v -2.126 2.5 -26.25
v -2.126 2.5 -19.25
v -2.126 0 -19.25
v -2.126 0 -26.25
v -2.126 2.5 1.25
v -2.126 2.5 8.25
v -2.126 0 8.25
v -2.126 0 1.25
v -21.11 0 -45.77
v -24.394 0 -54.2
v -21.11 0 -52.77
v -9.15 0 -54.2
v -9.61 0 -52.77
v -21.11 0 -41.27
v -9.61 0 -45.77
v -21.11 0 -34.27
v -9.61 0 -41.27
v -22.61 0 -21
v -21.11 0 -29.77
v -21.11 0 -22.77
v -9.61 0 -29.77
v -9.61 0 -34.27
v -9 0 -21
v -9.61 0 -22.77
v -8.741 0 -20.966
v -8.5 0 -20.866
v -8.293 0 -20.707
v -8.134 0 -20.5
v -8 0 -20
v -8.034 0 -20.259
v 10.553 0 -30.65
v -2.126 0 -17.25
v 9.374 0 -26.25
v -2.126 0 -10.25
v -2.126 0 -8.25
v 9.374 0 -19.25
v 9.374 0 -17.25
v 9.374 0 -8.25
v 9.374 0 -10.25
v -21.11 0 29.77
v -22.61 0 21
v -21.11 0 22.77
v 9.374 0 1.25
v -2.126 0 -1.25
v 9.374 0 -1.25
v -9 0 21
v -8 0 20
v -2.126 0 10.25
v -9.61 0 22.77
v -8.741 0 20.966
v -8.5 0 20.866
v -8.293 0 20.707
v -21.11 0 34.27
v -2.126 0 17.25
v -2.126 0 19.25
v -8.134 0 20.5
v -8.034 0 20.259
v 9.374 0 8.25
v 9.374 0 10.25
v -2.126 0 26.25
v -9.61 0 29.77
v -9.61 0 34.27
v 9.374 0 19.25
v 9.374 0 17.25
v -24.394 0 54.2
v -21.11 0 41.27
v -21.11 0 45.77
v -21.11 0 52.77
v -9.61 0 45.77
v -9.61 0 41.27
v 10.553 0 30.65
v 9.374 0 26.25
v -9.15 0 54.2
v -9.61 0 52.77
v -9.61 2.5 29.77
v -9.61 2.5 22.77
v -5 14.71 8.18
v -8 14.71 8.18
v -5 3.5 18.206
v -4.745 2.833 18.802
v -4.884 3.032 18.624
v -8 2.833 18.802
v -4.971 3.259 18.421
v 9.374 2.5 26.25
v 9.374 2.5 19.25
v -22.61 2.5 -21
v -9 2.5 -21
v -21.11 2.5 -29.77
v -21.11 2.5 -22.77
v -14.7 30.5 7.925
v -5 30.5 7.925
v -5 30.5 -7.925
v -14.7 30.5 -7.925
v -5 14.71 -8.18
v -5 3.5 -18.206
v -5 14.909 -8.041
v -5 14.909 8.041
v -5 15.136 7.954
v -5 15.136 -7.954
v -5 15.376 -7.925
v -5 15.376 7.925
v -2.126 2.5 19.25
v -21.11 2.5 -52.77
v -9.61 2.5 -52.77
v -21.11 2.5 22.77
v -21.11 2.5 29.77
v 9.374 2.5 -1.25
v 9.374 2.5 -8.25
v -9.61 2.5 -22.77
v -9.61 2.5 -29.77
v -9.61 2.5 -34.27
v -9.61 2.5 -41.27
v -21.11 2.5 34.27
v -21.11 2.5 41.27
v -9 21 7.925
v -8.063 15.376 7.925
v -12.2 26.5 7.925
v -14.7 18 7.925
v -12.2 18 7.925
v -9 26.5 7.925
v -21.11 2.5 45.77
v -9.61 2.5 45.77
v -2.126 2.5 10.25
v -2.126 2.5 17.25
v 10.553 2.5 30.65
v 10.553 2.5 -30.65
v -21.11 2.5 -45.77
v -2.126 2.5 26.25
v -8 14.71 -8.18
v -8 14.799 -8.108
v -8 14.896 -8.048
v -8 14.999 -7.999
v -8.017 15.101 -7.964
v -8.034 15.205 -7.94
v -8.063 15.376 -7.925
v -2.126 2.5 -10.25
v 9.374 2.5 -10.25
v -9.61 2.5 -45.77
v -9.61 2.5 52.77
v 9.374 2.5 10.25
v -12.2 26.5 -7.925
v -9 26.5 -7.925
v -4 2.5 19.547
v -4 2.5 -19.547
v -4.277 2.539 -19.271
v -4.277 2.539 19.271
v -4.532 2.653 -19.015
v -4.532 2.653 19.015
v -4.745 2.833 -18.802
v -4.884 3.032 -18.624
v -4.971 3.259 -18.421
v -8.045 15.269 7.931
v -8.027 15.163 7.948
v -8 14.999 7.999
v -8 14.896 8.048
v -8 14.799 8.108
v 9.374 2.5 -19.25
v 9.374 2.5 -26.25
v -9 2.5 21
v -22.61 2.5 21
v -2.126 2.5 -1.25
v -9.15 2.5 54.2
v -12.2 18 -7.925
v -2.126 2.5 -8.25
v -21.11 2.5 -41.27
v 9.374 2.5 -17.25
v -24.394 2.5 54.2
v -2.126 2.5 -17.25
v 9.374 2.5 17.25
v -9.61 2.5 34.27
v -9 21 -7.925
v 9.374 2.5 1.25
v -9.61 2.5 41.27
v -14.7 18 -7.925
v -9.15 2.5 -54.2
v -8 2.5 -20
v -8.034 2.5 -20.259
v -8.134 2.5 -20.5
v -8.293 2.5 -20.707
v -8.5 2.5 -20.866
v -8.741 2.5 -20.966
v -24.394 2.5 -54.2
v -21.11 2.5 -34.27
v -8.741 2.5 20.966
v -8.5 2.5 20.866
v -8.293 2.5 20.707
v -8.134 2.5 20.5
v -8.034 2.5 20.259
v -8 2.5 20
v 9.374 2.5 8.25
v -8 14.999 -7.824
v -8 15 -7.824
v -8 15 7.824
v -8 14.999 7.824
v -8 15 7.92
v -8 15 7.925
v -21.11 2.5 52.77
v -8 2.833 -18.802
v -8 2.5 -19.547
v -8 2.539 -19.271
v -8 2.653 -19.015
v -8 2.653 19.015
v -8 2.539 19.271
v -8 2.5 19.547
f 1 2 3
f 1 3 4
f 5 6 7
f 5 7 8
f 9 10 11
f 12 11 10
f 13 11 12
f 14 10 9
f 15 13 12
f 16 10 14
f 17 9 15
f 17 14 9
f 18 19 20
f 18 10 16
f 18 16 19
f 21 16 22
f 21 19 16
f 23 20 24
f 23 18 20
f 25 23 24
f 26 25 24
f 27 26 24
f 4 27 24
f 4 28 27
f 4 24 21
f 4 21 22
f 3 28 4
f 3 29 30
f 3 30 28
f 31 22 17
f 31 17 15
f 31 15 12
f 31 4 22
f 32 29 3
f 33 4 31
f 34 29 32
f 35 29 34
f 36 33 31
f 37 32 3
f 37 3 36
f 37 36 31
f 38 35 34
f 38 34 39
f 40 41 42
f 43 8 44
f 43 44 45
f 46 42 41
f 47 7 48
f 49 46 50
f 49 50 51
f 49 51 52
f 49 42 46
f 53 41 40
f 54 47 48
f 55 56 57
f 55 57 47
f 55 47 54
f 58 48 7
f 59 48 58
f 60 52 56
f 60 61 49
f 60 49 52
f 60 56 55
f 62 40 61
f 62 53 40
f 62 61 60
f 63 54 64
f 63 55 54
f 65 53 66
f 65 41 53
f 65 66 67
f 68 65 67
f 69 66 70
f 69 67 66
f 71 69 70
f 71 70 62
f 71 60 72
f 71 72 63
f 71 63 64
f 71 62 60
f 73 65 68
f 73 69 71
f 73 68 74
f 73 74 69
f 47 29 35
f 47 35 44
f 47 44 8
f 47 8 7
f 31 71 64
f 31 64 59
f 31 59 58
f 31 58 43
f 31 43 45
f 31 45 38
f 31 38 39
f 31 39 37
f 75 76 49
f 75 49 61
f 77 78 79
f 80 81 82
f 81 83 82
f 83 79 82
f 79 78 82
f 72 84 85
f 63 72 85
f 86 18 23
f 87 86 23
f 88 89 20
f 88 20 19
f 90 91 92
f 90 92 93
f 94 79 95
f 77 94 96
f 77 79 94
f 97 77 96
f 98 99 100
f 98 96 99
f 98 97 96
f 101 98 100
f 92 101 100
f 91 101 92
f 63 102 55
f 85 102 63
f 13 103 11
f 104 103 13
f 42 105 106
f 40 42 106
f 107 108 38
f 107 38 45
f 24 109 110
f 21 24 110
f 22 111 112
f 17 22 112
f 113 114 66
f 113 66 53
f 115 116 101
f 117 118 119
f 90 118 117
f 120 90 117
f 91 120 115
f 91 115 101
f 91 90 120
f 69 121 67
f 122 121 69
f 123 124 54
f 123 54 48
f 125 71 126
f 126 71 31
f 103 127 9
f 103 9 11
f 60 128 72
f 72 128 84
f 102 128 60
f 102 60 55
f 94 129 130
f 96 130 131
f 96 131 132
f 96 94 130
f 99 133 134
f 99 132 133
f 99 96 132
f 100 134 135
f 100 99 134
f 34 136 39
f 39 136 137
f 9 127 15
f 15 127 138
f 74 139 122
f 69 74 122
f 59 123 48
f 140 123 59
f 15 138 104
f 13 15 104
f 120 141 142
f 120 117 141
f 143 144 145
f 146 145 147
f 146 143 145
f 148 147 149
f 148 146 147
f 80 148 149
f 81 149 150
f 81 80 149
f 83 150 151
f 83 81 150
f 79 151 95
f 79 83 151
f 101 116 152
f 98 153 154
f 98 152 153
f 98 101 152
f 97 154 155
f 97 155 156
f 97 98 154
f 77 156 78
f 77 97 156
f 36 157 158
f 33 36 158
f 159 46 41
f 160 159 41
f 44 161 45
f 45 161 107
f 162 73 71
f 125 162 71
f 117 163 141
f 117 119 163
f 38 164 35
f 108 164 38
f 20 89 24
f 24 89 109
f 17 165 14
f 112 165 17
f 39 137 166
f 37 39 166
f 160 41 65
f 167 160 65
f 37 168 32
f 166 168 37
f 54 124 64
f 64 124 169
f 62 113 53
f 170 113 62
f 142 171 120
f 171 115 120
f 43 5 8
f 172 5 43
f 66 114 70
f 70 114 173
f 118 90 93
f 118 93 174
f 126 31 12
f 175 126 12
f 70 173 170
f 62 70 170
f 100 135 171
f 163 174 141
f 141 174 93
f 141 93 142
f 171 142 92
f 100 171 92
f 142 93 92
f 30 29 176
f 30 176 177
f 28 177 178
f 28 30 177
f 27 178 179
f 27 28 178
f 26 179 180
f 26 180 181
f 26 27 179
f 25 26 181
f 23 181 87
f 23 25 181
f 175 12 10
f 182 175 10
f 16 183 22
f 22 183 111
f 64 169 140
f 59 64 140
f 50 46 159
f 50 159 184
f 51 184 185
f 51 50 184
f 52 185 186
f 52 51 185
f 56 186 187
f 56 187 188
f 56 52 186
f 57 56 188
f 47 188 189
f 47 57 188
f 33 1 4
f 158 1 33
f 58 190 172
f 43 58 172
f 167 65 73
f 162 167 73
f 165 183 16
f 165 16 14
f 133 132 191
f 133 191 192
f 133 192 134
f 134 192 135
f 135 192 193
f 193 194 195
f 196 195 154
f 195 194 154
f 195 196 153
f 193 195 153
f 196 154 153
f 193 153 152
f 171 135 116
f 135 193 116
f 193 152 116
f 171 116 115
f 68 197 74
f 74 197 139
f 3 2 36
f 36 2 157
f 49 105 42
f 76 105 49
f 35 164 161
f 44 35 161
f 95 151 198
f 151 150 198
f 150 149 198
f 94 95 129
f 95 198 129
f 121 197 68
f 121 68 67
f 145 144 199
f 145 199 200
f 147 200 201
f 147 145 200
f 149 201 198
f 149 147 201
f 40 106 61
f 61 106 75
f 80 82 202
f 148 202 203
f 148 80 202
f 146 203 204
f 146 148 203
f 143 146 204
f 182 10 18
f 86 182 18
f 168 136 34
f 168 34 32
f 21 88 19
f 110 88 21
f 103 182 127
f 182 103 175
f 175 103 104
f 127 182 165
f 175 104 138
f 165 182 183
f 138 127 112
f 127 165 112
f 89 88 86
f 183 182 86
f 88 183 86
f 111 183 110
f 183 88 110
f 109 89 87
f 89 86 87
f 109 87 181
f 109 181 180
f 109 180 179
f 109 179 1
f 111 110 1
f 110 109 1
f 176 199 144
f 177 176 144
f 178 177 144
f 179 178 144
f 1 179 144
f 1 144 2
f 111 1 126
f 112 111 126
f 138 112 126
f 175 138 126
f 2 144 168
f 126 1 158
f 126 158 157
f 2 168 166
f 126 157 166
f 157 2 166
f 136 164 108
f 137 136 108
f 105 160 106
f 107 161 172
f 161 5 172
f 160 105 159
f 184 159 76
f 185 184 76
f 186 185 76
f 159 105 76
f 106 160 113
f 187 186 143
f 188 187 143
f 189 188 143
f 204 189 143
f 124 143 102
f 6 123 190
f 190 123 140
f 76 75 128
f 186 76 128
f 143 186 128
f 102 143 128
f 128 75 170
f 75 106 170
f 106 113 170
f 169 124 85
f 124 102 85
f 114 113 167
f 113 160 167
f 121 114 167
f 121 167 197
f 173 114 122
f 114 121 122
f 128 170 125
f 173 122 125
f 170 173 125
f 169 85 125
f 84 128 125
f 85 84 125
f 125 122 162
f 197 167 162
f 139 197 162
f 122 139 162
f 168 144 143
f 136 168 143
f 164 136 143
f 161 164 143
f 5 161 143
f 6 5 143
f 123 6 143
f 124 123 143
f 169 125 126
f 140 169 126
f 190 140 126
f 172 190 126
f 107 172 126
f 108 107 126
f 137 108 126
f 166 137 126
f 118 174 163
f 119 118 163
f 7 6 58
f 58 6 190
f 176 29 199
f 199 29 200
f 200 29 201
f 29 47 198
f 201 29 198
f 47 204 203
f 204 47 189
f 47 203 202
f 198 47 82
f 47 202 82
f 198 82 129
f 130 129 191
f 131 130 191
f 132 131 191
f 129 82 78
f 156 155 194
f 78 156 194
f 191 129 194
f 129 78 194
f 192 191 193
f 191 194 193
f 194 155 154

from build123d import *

# Parameters (mm, degrees)
RESSALTO_EXTRUS_O1_DEPTH  = 2.5
ESBO_O2_W                 = 3
ESBO_O2_H                 = 66
RESSALTO_EXTRUS_O2_DEPTH  = 12.5
ESBO_O4_W                 = 4
ESBO_O4_H                 = 11.5
ESBO_O4_W_2               = 2.5
ESBO_O4_H_2               = 8.5
RESSALTO_EXTRUS_O4_DEPTH  = 7.925
CHANFRO1_SIZE2            = 6
CHANFRO1_SIZE             = 1
CHANFRO2_SIZE             = 12
CORTE_EXTRUS_O2_DEPTH     = 3
CORTE_EXTRUS_O1_REACH     = 67.702
ESBO_O5_W                 = 11.5
ESBO_O5_H                 = 7
PADR_O_LINEAR1_COUNT      = 3
PADR_O_LINEAR1_PITCH      = 9
ESBO_O8_W                 = 11.5
ESBO_O8_H                 = 7
CORTE_EXTRUS_O4_DEPTH     = 10
PADR_O_LINEAR3_COUNT      = 3
PADR_O_LINEAR3_PITCH      = 11.5
ESPELHAR1_COPY_1_SKETCH_W = 11.5
ESPELHAR1_COPY_1_SKETCH_H = 7
ESPELHAR1_COPY_1_DEPTH    = 10
ESPELHAR1_COPY_2_SKETCH_W = 11.5
ESPELHAR1_COPY_2_SKETCH_H = 7
ESPELHAR1_COPY_2_DEPTH    = 10
ESPELHAR2_COPY_1_REACH    = 67.702
ESPELHAR2_COPY_1_SKETCH_W = 11.5
ESPELHAR2_COPY_1_SKETCH_H = 7
ESPELHAR2_COPY_2_REACH    = 67.702
ESPELHAR2_COPY_2_SKETCH_W = 11.5
ESPELHAR2_COPY_2_SKETCH_H = 7
FILETE3_R                 = 1
FILETE5_R                 = 1


# Some blends are built 0.0001 mm under size
with BuildPart() as part:
    # Esboço1 → Ressalto-extrusão1 (new body)
    with BuildSketch(Plane(origin=(0, 0, 0), x_dir=(1, 0, 0), z_dir=(0, 1, 0))):
        Polygon((-24.393815238, -54.2), (-9.15, -54.2), (10.553192421, -30.65), (10.553192421, 30.65), (-9.15, 54.2), (-24.393815238, 54.2), (-22.610275313, 21), (-8, 21), (-8, -21), (-22.610275313, -21), align=None)
    extrude(amount=RESSALTO_EXTRUS_O1_DEPTH)

    # Esboço2 → Ressalto-extrusão2 (add)
    with BuildSketch(Plane(origin=(0, 2.5, 0), x_dir=(1, 0, 0), z_dir=(0, 1, 0))):
        with Locations((-6.5, 0)):
            Rectangle(ESBO_O2_W, ESBO_O2_H)
    extrude(amount=RESSALTO_EXTRUS_O2_DEPTH)

    # Esboço4 → Ressalto-extrusão4 (add, symmetric)
    with BuildSketch(Plane.XY):
        with Locations((-7, 20.75)):
            Rectangle(ESBO_O4_W, ESBO_O4_H)
        Polygon((-9, 26.5), (-5, 26.5), (-5, 30.5), (-14.7, 30.5), (-14.7, 26.5), (-12.2, 26.5), align=None)
        with Locations((-13.45, 22.25)):
            Rectangle(ESBO_O4_W_2, ESBO_O4_H_2)
    extrude(amount=RESSALTO_EXTRUS_O4_DEPTH, both=True)

    # Chanfro1
    chanfro1_edges = [part.edges().sort_by_distance(p)[0] for p in [
        (-9, 15, 0),
    ]]
    chanfro1_side = [part.faces().sort_by_distance(p)[0] for p in [
        (-8.98, 15, 0),
    ]]
    chamfer(chanfro1_edges, length=CHANFRO1_SIZE - 0.0001, length2=CHANFRO1_SIZE2 - 0.0001, reference=chanfro1_side[0])  # a hair under: the kernel refuses the full size

    # Chanfro2
    chanfro2_edges = [part.edges().sort_by_distance(p)[0] for p in [
        (-6.5, 15, 33),
        (-6.5, 15, -33),
    ]]
    chamfer(chanfro2_edges, length=CHANFRO2_SIZE)

    # Esboço6 → Corte-extrusão2 (cut)
    with BuildSketch(Plane(origin=(-5, 0, 0), x_dir=(0, 0, -1), z_dir=(1, 0, 0))):
        Polygon((-7.92, 15), (-33, 15), (-33, 2.5), (-19.1, 2.5), align=None)
    corte_extrus_o2 = extrude(amount=-CORTE_EXTRUS_O2_DEPTH, mode=Mode.SUBTRACT)

    # Esboço5 → Corte-extrusão1 (cut, up to next)
    with BuildSketch(Plane(origin=(0, 2.5, 0), x_dir=(1, 0, 0), z_dir=(0, 1, 0)), mode=Mode.PRIVATE) as corte_extrus_o1_sk1:
        with Locations((3.624348025, -4.75)):
            Rectangle(ESBO_O5_W, ESBO_O5_H)
    corte_extrus_o1_tool1 = extrude(corte_extrus_o1_sk1.sketch, amount=-CORTE_EXTRUS_O1_REACH, mode=Mode.PRIVATE) & part.part
    corte_extrus_o1 = corte_extrus_o1_tool1.solids().sort_by_distance((3.624348, 2.5, 4.75))[0]
    add(corte_extrus_o1, mode=Mode.SUBTRACT)

    # Padrão linear1: Corte-extrusão1 ×3
    with Locations(*[(0, 0, i * PADR_O_LINEAR1_PITCH) for i in range(1, PADR_O_LINEAR1_COUNT)]):
        add(corte_extrus_o1, mode=Mode.SUBTRACT)

    # Esboço8 → Corte-extrusão4 (cut)
    with BuildSketch(Plane(origin=(0, 2.5, 0), x_dir=(1, 0, 0), z_dir=(0, 1, 0))):
        with Locations((-15.36, 26.27)):
            Rectangle(ESBO_O8_W, ESBO_O8_H)
    corte_extrus_o4 = extrude(amount=-CORTE_EXTRUS_O4_DEPTH, mode=Mode.SUBTRACT)

    # Padrão linear3: Corte-extrusão4 ×3
    with Locations(*[(0, 0, -i * PADR_O_LINEAR3_PITCH) for i in range(1, PADR_O_LINEAR3_COUNT)]):
        add(corte_extrus_o4, mode=Mode.SUBTRACT)

    # Espelhar1: Corte-extrusão4 across plane
    add(corte_extrus_o4.mirror(Plane.XY), mode=Mode.SUBTRACT)

    # Espelhar1 copy 1 sketch → Espelhar1 copy 1 (cut)
    with BuildSketch(Plane(origin=(0, 2.5, 11.5), x_dir=(1, 0, 0), z_dir=(0, 1, 0))):
        with Locations((-15.36, -26.27)):
            Rectangle(ESPELHAR1_COPY_1_SKETCH_W, ESPELHAR1_COPY_1_SKETCH_H)
    extrude(amount=-ESPELHAR1_COPY_1_DEPTH, mode=Mode.SUBTRACT)

    # Espelhar1 copy 2 sketch → Espelhar1 copy 2 (cut)
    with BuildSketch(Plane(origin=(0, 2.5, 23), x_dir=(1, 0, 0), z_dir=(0, 1, 0))):
        with Locations((-15.36, -26.27)):
            Rectangle(ESPELHAR1_COPY_2_SKETCH_W, ESPELHAR1_COPY_2_SKETCH_H)
    extrude(amount=-ESPELHAR1_COPY_2_DEPTH, mode=Mode.SUBTRACT)

    # Espelhar2: Corte-extrusão1 across plane
    add(corte_extrus_o1.mirror(Plane.XY), mode=Mode.SUBTRACT)

    # Espelhar2 copy 1 sketch → Espelhar2 copy 1 (cut, up to next)
    with BuildSketch(Plane(origin=(0, 2.5, -9), x_dir=(1, 0, 0), z_dir=(0, 1, 0)), mode=Mode.PRIVATE) as espelhar2_copy_1_sk1:
        with Locations((3.624348025, 4.75)):
            Rectangle(ESPELHAR2_COPY_1_SKETCH_W, ESPELHAR2_COPY_1_SKETCH_H)
    espelhar2_copy_1_tool1 = extrude(espelhar2_copy_1_sk1.sketch, amount=-ESPELHAR2_COPY_1_REACH, mode=Mode.PRIVATE) & part.part
    add(espelhar2_copy_1_tool1.solids().sort_by_distance((3.624348, 2.5, -13.75))[0], mode=Mode.SUBTRACT)

    # Espelhar2 copy 2 sketch → Espelhar2 copy 2 (cut, up to next)
    with BuildSketch(Plane(origin=(0, 2.5, -18), x_dir=(1, 0, 0), z_dir=(0, 1, 0)), mode=Mode.PRIVATE) as espelhar2_copy_2_sk1:
        with Locations((3.624348025, 4.75)):
            Rectangle(ESPELHAR2_COPY_2_SKETCH_W, ESPELHAR2_COPY_2_SKETCH_H)
    espelhar2_copy_2_tool1 = extrude(espelhar2_copy_2_sk1.sketch, amount=-ESPELHAR2_COPY_2_REACH, mode=Mode.PRIVATE) & part.part
    add(espelhar2_copy_2_tool1.solids().sort_by_distance((3.624348, 2.5, -22.75))[0], mode=Mode.SUBTRACT)

    # Espelhar3: Corte-extrusão2 across plane
    add(corte_extrus_o2.mirror(Plane.XY), mode=Mode.SUBTRACT)

    # Filete3
    # the kernel refuses this fillet: 1 mm, written as the material it adds along each edge
    with BuildSketch(Plane(origin=(-8, 0, 21), x_dir=(-1, 0, 0), z_dir=(0, 1, 0)), Plane(origin=(-8, 0, -21), x_dir=(0, 0, 1), z_dir=(0, 1, 0))) as filete3_piece_1:
        with BuildLine():
            CenterArc((FILETE3_R, -FILETE3_R), FILETE3_R, 90, 90)
            Line((0, -FILETE3_R), (0, 0))
            Line((0, 0), (FILETE3_R, 0))
        make_face()
    extrude(amount=2.5)
    with BuildSketch(Plane(origin=(-5, 2.5, 19.1), x_dir=(0, 0, 1), z_dir=(-1, 0, 0))) as filete3_piece_2:
        with BuildLine():
            CenterArc((FILETE3_R * 0.44722265932, FILETE3_R), FILETE3_R, 221.809449368, 48.190550632)
            Line((-FILETE3_R * 0.298143403972, FILETE3_R * 0.333344592992), (0, 0))
            Line((0, 0), (FILETE3_R * 0.44722265932, 0))
        make_face()
    extrude(amount=3)
    with BuildSketch(Plane(origin=(-5, 2.5, -19.1), x_dir=(0, 0, -1), z_dir=(-1, 0, 0))) as filete3_piece_3:
        with BuildLine():
            CenterArc((FILETE3_R * 0.44722265932, -FILETE3_R), FILETE3_R, 90, 48.190550632)
            Line((-FILETE3_R * 0.298143403972, -FILETE3_R * 0.333344592992), (0, 0))
            Line((0, 0), (FILETE3_R * 0.44722265932, 0))
        make_face()
    extrude(amount=3)
    with BuildSketch(Plane(origin=(-5, 2.5, 21.6), x_dir=(1, 0, 0), z_dir=(0, 0, -1))) as filete3_piece_4_section:
        with BuildLine():
            CenterArc((FILETE3_R, -FILETE3_R), FILETE3_R, 90, 90)
            Line((0, -FILETE3_R), (0, 0))
            Line((0, 0), (FILETE3_R, 0))
        make_face()
    filete3_piece_4 = extrude(amount=43.2, mode=Mode.PRIVATE)
    filete3_piece_4 = split(filete3_piece_4, bisect_by=Plane(origin=(-5, 1.257744209, 20.211073579), z_dir=(0, -0.6666554070080641, -0.7453660632916638)), keep=Keep.TOP, mode=Mode.PRIVATE)
    filete3_piece_4 = split(filete3_piece_4, bisect_by=Plane(origin=(-5, 22.723924273, -1.01172213), z_dir=(0, -0.6666554070080641, 0.7453660632916638)), keep=Keep.TOP, mode=Mode.PRIVATE)
    add(filete3_piece_4)
    with BuildSketch(Plane(origin=(-5, 2.5, 21.6), x_dir=(1, 0, 0), z_dir=(0, 0, -1))) as filete3_piece_5a_section:
        with BuildLine():
            CenterArc((FILETE3_R, -FILETE3_R), FILETE3_R, 90, 90)
            Line((0, -FILETE3_R), (0, 0))
            Line((0, 0), (FILETE3_R, 0))
        make_face()
    filete3_piece_5a = extrude(amount=43.2, mode=Mode.PRIVATE)
    filete3_piece_5a = split(filete3_piece_5a, bisect_by=Plane(origin=(-5, 1.257744209, 20.211073579), z_dir=(0, 0.6666554070080641, 0.7453660632916638)), keep=Keep.TOP, mode=Mode.PRIVATE)
    with BuildSketch(Plane(origin=(-3.881943352, 2.5, 19.1), x_dir=(0, 0, 1), z_dir=(-1, 0, 0))) as filete3_piece_5b_section:
        with BuildLine():
            CenterArc((FILETE3_R * 0.44722265932, FILETE3_R), FILETE3_R, 221.809449368, 48.190550632)
            Line((-FILETE3_R * 0.298143403972, FILETE3_R * 0.333344592992), (0, 0))
            Line((0, 0), (FILETE3_R * 0.44722265932, 0))
        make_face()
    filete3_piece_5b = extrude(amount=4.118056648, mode=Mode.PRIVATE)
    filete3_piece_5b = split(filete3_piece_5b, bisect_by=Plane(origin=(-5, 2.5, 19.1), z_dir=(1, 0, 0)), keep=Keep.TOP, mode=Mode.PRIVATE)
    filete3_piece_5 = filete3_piece_5a & filete3_piece_5b
    add(filete3_piece_5)
    with BuildSketch(Plane(origin=(-3.881943352, 2.5, -19.1), x_dir=(0, 0, -1), z_dir=(-1, 0, 0))) as filete3_piece_6a_section:
        with BuildLine():
            CenterArc((FILETE3_R * 0.44722265932, -FILETE3_R), FILETE3_R, 90, 48.190550632)
            Line((-FILETE3_R * 0.298143403972, -FILETE3_R * 0.333344592992), (0, 0))
            Line((0, 0), (FILETE3_R * 0.44722265932, 0))
        make_face()
    filete3_piece_6a = extrude(amount=4.118056648, mode=Mode.PRIVATE)
    filete3_piece_6a = split(filete3_piece_6a, bisect_by=Plane(origin=(-5, 2.5, -19.1), z_dir=(1, 0, 0)), keep=Keep.TOP, mode=Mode.PRIVATE)
    with BuildSketch(Plane(origin=(-5, 2.5, 21.6), x_dir=(1, 0, 0), z_dir=(0, 0, -1))) as filete3_piece_6b_section:
        with BuildLine():
            CenterArc((FILETE3_R, -FILETE3_R), FILETE3_R, 90, 90)
            Line((0, -FILETE3_R), (0, 0))
            Line((0, 0), (FILETE3_R, 0))
        make_face()
    filete3_piece_6b = extrude(amount=43.2, mode=Mode.PRIVATE)
    filete3_piece_6b = split(filete3_piece_6b, bisect_by=Plane(origin=(-5, 22.723924273, -1.01172213), z_dir=(0, 0.6666554070080641, -0.7453660632916638)), keep=Keep.TOP, mode=Mode.PRIVATE)
    filete3_piece_6 = filete3_piece_6a & filete3_piece_6b
    add(filete3_piece_6)
    # the kernel refuses this fillet: 1 mm, written as the material it takes off along each edge
    with BuildSketch(Plane(origin=(-4.750312696, 15, -7.925), x_dir=(0, 0, 1), z_dir=(-1, 0, 0))) as filete3_2_piece_1:
        with BuildLine():
            CenterArc((1, 0.099874922), FILETE3_R, 180, 5.731967965)
            Line((0, 0.099874922), (0, 0))
            Line((0, 0), (0.005, 0))
        make_face()
    extrude(amount=3.499374609, mode=Mode.SUBTRACT)
    with BuildSketch(Plane(origin=(-4.750312696, 15, 7.925), x_dir=(0, 0, -1), z_dir=(-1, 0, 0))) as filete3_2_piece_2:
        with BuildLine():
            CenterArc((1, -0.099874922), FILETE3_R, 174.268032035, 5.731967965)
            Line((0, -0.099874922), (0, 0))
            Line((0, 0), (0.005, 0))
        make_face()
    extrude(amount=3.499374609, mode=Mode.SUBTRACT)

    # Filete5
    # the kernel refuses this fillet: 1 mm, written as the material it adds along each edge
    with BuildSketch(Plane(origin=(-5, 15, -7.92), x_dir=(0, -0.7453660632967485, -0.666655407002379), z_dir=(-1, 0, 0))) as filete5_piece_1_section:
        with BuildLine():
            CenterArc((0.389457483, -1), FILETE5_R, 90, 41.809449368)
            Line((-0.277197924, -0.254633937), (-0.343863465, -0.18009733))
            ThreePointArc((-0.343863465, -0.18009733), (-0.137775641, 0.004227619), (-0.073776551, 0.067505708))
            Line((-0.073776551, 0.067505708), (0, 0.1))
            Line((0, 0.1), (0.389457483, 0.1))
            Line((0.389457483, 0.1), (0.389457483, 0))
        make_face()
    filete5_piece_1 = extrude(amount=3, mode=Mode.PRIVATE)
    filete5_piece_1 = split(filete5_piece_1, bisect_by=Plane(origin=(-5, 15, -7.92), z_dir=(0, -1, 0)), keep=Keep.TOP, mode=Mode.PRIVATE)
    filete5_piece_1 = split(filete5_piece_1, bisect_by=Plane(origin=(-7.919029365, 14.513535649, -7.92), z_dir=(0.9863961453920427, 0.1643856573905407, 0)), keep=Keep.TOP, mode=Mode.PRIVATE)
    add(filete5_piece_1)
    with BuildSketch(Plane(origin=(-5, 15, -7.92), x_dir=(0, -0.7453660632967485, -0.666655407002379), z_dir=(-1, 0, 0))) as filete5_piece_2_section:
        with BuildLine():
            CenterArc((0.389457483, -1), FILETE5_R, 90, 41.809449368)
            Line((-0.277197924, -0.254633937), (-0.343863465, -0.18009733))
            ThreePointArc((-0.343863465, -0.18009733), (-0.137775641, 0.004227619), (-0.073776551, 0.067505708))
            Line((-0.073776551, 0.067505708), (0, 0.1))
            Line((0, 0.1), (0.389457483, 0.1))
            Line((0.389457483, 0.1), (0.389457483, 0))
        make_face()
    filete5_piece_2 = extrude(amount=3, mode=Mode.PRIVATE)
    filete5_piece_2 = split(filete5_piece_2, bisect_by=Plane(origin=(-5, 15, -7.92), z_dir=(0, 1, 0)), keep=Keep.TOP, mode=Mode.PRIVATE)
    add(filete5_piece_2)
    with BuildSketch(Plane(origin=(-5, 15, -7.92), x_dir=(0, -0.7453660632967485, -0.666655407002379), z_dir=(-1, 0, 0))) as filete5_piece_3_section:
        with BuildLine():
            CenterArc((0.389457483, -1), FILETE5_R, 90, 41.809449368)
            Line((-0.277197924, -0.254633937), (-0.343863465, -0.18009733))
            ThreePointArc((-0.343863465, -0.18009733), (-0.137775641, 0.004227619), (-0.073776551, 0.067505708))
            Line((-0.073776551, 0.067505708), (0, 0.1))
            Line((0, 0.1), (0.389457483, 0.1))
            Line((0.389457483, 0.1), (0.389457483, 0))
        make_face()
    filete5_piece_3 = extrude(amount=3, mode=Mode.PRIVATE)
    filete5_piece_3 = split(filete5_piece_3, bisect_by=Plane(origin=(-7.919029365, 14.513535649, -7.92), z_dir=(-0.9863961453920427, -0.1643856573905407, 0)), keep=Keep.TOP, mode=Mode.PRIVATE)
    add(filete5_piece_3)
    with BuildSketch(Plane(origin=(-5, 15, -7.92), x_dir=(0, -0.7453660632967485, -0.666655407002379), z_dir=(-1, 0, 0))) as filete5_piece_4_section:
        with BuildLine():
            CenterArc((0.389457483, -1), FILETE5_R, 90, 41.809449368)
            Line((-0.277197924, -0.254633937), (-0.343863465, -0.18009733))
            ThreePointArc((-0.343863465, -0.18009733), (-0.137775641, 0.004227619), (-0.073776551, 0.067505708))
            Line((-0.073776551, 0.067505708), (0, 0.1))
            Line((0, 0.1), (0.389457483, 0.1))
            Line((0.389457483, 0.1), (0.389457483, 0))
        make_face()
    filete5_piece_4 = extrude(amount=3.973643707, mode=Mode.PRIVATE)
    filete5_piece_4 = split(filete5_piece_4, bisect_by=Plane(origin=(-8, 15, -7.92), z_dir=(-1, 0, 0)), keep=Keep.TOP, mode=Mode.PRIVATE)
    filete5_piece_4 = split(filete5_piece_4, bisect_by=Plane(origin=(-7.919029365, 14.513535649, -7.92), z_dir=(0.9863961453920427, 0.1643856573905407, 0)), keep=Keep.TOP, mode=Mode.PRIVATE)
    add(filete5_piece_4)
    with BuildSketch(Plane(origin=(-5, 15, 7.92), x_dir=(0, -0.7453660632826157, 0.6666554070181805), z_dir=(-1, 0, 0))) as filete5_piece_5_section:
        with BuildLine():
            CenterArc((0.389457483, 1), FILETE5_R, 228.190550632, 41.809449368)
            Line((-0.277197924, 0.254633937), (-0.343863465, 0.18009733))
            ThreePointArc((-0.343863465, 0.18009733), (-0.137775641, -0.004227619), (-0.073776551, -0.067505708))
            Line((-0.073776551, -0.067505708), (0, -0.1))
            Line((0, -0.1), (0.389457483, -0.1))
            Line((0.389457483, -0.1), (0.389457483, 0))
        make_face()
    filete5_piece_5 = extrude(amount=3, mode=Mode.PRIVATE)
    filete5_piece_5 = split(filete5_piece_5, bisect_by=Plane(origin=(-5, 15, 7.92), z_dir=(0, -1, 0)), keep=Keep.TOP, mode=Mode.PRIVATE)
    filete5_piece_5 = split(filete5_piece_5, bisect_by=Plane(origin=(-7.919029365, 14.513535649, 7.92), z_dir=(0.9863961453920427, 0.1643856573905407, 0)), keep=Keep.TOP, mode=Mode.PRIVATE)
    add(filete5_piece_5)
    with BuildSketch(Plane(origin=(-5, 15, 7.92), x_dir=(0, -0.7453660632826157, 0.6666554070181805), z_dir=(-1, 0, 0))) as filete5_piece_6_section:
        with BuildLine():
            CenterArc((0.389457483, 1), FILETE5_R, 228.190550632, 41.809449368)
            Line((-0.277197924, 0.254633937), (-0.343863465, 0.18009733))
            ThreePointArc((-0.343863465, 0.18009733), (-0.137775641, -0.004227619), (-0.073776551, -0.067505708))
            Line((-0.073776551, -0.067505708), (0, -0.1))
            Line((0, -0.1), (0.389457483, -0.1))
            Line((0.389457483, -0.1), (0.389457483, 0))
        make_face()
    filete5_piece_6 = extrude(amount=3, mode=Mode.PRIVATE)
    filete5_piece_6 = split(filete5_piece_6, bisect_by=Plane(origin=(-5, 15, 7.92), z_dir=(0, 1, 0)), keep=Keep.TOP, mode=Mode.PRIVATE)
    add(filete5_piece_6)
    with BuildSketch(Plane(origin=(-5, 15, 7.92), x_dir=(0, -0.7453660632826157, 0.6666554070181805), z_dir=(-1, 0, 0))) as filete5_piece_7_section:
        with BuildLine():
            CenterArc((0.389457483, 1), FILETE5_R, 228.190550632, 41.809449368)
            Line((-0.277197924, 0.254633937), (-0.343863465, 0.18009733))
            ThreePointArc((-0.343863465, 0.18009733), (-0.137775641, -0.004227619), (-0.073776551, -0.067505708))
            Line((-0.073776551, -0.067505708), (0, -0.1))
            Line((0, -0.1), (0.389457483, -0.1))
            Line((0.389457483, -0.1), (0.389457483, 0))
        make_face()
    filete5_piece_7 = extrude(amount=3, mode=Mode.PRIVATE)
    filete5_piece_7 = split(filete5_piece_7, bisect_by=Plane(origin=(-7.919029365, 14.513535649, 7.92), z_dir=(-0.9863961453920427, -0.1643856573905407, 0)), keep=Keep.TOP, mode=Mode.PRIVATE)
    add(filete5_piece_7)
    with BuildSketch(Plane(origin=(-5, 15, 7.92), x_dir=(0, -0.7453660632826157, 0.6666554070181805), z_dir=(-1, 0, 0))) as filete5_piece_8_section:
        with BuildLine():
            CenterArc((0.389457483, 1), FILETE5_R, 228.190550632, 41.809449368)
            Line((-0.277197924, 0.254633937), (-0.343863465, 0.18009733))
            ThreePointArc((-0.343863465, 0.18009733), (-0.137775641, -0.004227619), (-0.073776551, -0.067505708))
            Line((-0.073776551, -0.067505708), (0, -0.1))
            Line((0, -0.1), (0.389457483, -0.1))
            Line((0.389457483, -0.1), (0.389457483, 0))
        make_face()
    filete5_piece_8 = extrude(amount=3.973643707, mode=Mode.PRIVATE)
    filete5_piece_8 = split(filete5_piece_8, bisect_by=Plane(origin=(-8, 15, 7.92), z_dir=(-1, 0, 0)), keep=Keep.TOP, mode=Mode.PRIVATE)
    filete5_piece_8 = split(filete5_piece_8, bisect_by=Plane(origin=(-7.919029365, 14.513535649, 7.92), z_dir=(0.9863961453920427, 0.1643856573905407, 0)), keep=Keep.TOP, mode=Mode.PRIVATE)
    add(filete5_piece_8)


solid = part.part
